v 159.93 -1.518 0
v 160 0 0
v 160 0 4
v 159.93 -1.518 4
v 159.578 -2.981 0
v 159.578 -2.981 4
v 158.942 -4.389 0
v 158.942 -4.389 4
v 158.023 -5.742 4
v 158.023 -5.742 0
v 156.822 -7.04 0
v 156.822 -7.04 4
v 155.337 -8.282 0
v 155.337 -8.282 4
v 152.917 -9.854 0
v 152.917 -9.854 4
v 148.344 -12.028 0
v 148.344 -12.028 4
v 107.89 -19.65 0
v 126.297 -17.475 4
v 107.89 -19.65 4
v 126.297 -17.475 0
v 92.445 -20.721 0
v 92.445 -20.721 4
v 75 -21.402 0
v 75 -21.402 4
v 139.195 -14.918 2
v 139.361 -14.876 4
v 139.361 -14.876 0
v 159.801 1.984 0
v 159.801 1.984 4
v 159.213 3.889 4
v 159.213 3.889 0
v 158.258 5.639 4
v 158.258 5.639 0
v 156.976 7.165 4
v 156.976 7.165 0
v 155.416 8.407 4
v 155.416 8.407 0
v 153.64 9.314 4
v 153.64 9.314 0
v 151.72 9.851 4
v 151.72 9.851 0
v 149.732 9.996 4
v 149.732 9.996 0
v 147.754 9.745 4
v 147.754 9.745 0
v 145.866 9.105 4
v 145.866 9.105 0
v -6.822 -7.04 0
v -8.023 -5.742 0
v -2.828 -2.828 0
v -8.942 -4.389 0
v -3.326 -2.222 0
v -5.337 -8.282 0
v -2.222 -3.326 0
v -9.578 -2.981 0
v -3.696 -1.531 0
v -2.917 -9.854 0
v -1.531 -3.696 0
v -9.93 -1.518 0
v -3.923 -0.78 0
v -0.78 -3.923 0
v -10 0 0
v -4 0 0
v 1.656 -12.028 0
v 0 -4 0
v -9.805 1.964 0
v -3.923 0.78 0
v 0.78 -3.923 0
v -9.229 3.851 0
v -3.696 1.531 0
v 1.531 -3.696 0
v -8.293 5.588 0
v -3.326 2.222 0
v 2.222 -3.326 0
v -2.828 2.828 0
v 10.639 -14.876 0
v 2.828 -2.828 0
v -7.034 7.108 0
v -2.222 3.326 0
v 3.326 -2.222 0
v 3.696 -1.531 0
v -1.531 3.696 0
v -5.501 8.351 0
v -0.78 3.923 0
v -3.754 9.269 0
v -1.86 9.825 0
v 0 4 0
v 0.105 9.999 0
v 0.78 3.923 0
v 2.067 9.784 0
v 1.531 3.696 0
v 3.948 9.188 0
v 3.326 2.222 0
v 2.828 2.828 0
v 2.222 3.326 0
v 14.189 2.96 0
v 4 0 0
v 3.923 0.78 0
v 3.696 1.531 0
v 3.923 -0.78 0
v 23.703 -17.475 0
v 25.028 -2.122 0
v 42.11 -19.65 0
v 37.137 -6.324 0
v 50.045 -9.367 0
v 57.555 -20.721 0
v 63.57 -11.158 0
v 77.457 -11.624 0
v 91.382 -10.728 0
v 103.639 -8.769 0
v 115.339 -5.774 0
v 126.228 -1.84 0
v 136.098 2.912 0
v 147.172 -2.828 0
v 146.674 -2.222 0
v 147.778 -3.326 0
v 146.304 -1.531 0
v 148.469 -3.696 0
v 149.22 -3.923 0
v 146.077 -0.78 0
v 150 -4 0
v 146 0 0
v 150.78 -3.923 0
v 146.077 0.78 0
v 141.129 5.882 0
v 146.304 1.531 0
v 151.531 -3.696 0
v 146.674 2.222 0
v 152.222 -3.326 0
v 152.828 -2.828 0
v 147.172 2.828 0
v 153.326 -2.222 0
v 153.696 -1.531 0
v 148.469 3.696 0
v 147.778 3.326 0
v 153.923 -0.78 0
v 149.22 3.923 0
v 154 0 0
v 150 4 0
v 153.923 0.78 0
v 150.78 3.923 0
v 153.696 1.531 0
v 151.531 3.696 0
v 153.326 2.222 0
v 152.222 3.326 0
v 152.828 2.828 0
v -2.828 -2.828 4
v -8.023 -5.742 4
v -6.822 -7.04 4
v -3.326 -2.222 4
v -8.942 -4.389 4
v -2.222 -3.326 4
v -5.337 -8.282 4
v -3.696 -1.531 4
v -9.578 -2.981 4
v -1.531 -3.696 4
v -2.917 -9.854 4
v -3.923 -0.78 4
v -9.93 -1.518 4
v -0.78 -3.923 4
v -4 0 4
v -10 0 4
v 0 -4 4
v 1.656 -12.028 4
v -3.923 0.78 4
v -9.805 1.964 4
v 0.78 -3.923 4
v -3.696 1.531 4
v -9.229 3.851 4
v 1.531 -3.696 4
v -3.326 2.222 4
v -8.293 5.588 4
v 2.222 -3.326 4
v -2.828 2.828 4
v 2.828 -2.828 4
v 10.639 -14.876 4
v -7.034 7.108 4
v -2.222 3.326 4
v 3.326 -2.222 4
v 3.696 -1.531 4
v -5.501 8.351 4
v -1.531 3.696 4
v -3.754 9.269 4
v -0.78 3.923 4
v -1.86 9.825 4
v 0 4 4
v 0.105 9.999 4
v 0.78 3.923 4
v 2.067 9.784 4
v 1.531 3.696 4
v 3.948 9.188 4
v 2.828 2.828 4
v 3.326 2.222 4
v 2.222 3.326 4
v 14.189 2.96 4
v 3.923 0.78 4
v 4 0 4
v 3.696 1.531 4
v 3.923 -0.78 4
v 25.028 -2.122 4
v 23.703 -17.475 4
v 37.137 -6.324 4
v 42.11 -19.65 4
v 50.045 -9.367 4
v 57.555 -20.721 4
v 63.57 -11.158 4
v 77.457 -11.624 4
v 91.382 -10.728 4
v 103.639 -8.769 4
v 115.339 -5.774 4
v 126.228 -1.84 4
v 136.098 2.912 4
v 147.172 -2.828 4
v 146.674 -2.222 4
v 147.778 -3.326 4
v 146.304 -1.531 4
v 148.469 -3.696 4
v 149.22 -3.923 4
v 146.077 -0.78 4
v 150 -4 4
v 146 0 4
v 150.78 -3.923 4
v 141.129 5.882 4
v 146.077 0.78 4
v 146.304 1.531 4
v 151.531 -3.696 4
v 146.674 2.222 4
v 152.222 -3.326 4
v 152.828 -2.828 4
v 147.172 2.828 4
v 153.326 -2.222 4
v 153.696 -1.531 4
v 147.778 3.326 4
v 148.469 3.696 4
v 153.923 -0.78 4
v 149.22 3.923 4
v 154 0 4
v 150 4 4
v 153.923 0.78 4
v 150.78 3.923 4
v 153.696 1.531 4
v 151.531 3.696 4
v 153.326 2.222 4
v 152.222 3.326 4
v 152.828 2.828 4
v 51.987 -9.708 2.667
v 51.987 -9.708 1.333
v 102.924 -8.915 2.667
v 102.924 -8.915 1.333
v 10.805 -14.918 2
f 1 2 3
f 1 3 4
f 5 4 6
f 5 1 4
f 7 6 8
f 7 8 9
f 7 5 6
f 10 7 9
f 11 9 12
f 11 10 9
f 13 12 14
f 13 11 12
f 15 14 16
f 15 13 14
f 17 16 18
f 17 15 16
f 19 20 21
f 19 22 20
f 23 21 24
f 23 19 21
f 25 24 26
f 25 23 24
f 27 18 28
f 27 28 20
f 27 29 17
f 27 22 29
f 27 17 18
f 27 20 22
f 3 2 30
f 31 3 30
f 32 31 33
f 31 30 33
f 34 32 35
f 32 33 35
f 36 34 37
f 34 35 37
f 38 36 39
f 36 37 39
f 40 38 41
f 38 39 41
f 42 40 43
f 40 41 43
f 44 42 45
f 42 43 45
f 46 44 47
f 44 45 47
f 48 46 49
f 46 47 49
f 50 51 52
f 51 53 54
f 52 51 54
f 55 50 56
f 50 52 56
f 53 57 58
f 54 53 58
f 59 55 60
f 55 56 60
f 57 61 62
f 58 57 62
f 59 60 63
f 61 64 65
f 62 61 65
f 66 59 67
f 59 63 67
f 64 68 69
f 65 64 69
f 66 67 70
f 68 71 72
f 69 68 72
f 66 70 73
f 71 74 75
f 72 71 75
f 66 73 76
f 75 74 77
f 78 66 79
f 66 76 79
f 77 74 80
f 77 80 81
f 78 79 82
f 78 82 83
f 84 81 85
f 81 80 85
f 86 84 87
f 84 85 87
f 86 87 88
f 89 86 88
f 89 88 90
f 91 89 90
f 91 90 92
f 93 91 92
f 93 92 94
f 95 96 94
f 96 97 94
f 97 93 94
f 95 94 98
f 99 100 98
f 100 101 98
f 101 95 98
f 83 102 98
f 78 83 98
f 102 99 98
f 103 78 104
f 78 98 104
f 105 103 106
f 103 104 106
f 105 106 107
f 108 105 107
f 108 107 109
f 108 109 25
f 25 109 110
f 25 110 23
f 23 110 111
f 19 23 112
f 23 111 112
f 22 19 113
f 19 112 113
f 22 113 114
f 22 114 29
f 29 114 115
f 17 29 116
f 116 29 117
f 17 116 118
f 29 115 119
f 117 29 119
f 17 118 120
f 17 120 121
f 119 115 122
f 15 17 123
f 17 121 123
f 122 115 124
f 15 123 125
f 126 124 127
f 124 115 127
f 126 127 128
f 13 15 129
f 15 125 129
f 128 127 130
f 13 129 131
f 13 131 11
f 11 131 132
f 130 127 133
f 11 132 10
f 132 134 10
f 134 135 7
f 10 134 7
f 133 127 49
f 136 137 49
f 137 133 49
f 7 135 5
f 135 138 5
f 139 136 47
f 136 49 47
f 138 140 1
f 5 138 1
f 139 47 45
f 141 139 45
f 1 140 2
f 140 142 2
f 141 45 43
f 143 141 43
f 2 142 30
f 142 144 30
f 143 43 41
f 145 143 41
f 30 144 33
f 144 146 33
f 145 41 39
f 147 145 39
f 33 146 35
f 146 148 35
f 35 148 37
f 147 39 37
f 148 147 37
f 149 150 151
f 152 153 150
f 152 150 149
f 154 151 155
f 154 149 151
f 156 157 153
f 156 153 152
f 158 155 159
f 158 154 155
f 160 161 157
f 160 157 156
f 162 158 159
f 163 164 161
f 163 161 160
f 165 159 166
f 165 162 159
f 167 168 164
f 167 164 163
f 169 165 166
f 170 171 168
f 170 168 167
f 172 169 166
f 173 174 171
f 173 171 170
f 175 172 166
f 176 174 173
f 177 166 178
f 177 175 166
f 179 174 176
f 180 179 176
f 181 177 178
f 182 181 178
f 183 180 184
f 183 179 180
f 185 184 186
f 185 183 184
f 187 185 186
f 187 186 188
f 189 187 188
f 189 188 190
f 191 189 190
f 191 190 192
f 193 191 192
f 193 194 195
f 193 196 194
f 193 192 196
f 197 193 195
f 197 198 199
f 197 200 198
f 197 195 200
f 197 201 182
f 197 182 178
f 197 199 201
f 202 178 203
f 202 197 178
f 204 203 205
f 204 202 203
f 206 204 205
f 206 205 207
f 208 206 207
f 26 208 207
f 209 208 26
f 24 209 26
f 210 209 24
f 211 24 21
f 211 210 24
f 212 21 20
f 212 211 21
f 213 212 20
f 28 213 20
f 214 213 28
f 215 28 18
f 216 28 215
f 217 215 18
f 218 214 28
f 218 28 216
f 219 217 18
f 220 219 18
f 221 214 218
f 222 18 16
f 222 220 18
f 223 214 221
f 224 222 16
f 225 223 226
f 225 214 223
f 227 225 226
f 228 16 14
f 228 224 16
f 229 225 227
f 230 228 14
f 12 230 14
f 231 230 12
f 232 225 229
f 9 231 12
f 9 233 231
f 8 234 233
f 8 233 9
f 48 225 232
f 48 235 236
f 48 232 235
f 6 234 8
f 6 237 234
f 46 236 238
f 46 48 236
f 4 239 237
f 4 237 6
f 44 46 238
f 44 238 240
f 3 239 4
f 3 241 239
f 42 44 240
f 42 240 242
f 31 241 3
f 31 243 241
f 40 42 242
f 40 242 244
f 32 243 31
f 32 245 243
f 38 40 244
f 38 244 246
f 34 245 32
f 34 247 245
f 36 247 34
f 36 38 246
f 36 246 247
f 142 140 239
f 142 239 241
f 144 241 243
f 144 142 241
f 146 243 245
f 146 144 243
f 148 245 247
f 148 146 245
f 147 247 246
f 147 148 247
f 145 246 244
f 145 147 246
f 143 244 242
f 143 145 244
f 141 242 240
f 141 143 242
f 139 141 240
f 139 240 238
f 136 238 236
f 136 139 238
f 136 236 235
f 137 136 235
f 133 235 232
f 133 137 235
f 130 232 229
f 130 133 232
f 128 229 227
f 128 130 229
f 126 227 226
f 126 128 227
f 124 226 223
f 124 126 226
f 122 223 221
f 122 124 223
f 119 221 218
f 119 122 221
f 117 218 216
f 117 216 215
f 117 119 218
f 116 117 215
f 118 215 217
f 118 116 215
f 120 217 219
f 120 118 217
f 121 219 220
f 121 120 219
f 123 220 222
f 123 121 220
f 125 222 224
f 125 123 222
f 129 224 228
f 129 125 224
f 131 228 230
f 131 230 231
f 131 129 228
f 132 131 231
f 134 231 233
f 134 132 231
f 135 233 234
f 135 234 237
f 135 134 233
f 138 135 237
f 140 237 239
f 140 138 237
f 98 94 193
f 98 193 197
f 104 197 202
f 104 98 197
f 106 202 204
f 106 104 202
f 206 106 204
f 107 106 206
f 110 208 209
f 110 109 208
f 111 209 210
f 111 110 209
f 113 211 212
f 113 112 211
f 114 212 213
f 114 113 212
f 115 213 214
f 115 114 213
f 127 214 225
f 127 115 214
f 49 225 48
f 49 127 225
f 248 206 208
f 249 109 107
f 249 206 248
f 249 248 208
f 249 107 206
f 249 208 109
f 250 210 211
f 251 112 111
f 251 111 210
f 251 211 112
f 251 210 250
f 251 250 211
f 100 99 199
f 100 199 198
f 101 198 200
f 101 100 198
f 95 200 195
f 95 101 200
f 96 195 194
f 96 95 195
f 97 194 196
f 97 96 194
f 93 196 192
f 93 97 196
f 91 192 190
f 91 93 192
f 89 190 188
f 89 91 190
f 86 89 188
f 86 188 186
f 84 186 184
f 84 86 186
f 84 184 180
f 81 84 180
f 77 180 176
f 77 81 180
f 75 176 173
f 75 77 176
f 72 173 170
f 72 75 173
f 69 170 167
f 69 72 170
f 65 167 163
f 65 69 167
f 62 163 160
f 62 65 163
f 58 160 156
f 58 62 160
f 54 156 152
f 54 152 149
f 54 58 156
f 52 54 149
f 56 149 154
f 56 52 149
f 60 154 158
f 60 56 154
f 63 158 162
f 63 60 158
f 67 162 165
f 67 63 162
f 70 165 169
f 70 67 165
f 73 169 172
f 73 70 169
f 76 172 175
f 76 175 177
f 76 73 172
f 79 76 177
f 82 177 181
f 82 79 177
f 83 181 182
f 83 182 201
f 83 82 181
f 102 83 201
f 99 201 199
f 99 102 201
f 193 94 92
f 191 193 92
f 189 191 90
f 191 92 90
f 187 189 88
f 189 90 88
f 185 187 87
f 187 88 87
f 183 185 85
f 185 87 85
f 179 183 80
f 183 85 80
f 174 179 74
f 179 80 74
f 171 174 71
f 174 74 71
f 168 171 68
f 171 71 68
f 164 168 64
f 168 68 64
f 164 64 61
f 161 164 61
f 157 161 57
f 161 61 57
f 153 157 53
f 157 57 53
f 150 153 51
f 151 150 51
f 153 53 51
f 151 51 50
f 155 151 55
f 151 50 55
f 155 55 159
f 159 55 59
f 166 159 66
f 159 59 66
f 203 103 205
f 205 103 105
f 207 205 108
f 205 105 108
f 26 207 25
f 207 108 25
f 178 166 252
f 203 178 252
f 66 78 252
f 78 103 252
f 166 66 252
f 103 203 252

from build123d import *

# Parameters (mm, degrees)
SKETCH_1_R      = 4
EXTRUDE_1_DEPTH = 4


with BuildPart() as part:
    # 草图1 → 凸台-拉伸1 (new body)
    with BuildSketch(Plane.XY):
        with BuildLine():
            ThreePointArc((3.948047826, 9.187650318), (-5.50088728, 8.351062156), (-10, 0))
            add(Edge.make_bspline(
                [(-10, 0), (-10.890214237, -19.135341361), (75, -21.401956932)],
                knots=[0, 0, 0, 1, 1, 1], degree=2))
            add(Edge.make_bspline(
                [(160, 0), (160.890214237, -19.135341361), (75, -21.401956932)],
                knots=[0, 0, 0, 1, 1, 1], degree=2))
            ThreePointArc((160, 0), (155.415713455, 8.40654791), (145.865990446, 9.105490926))
            add(Edge.make_bspline(
                [(3.948047826, 9.187650318), (46.906488456, -20.373746255), (110.551742639, -16.70704022), (145.865990446, 9.105490926)],
                knots=[0.022448948, 0.022448948, 0.022448948, 0.022448948, 0.850781246, 0.850781246, 0.850781246, 0.850781246], degree=3))
        make_face()
        Circle(SKETCH_1_R, mode=Mode.SUBTRACT)
        with Locations((150, 0)):
            Circle(SKETCH_1_R, mode=Mode.SUBTRACT)
    extrude(amount=EXTRUDE_1_DEPTH)


solid = part.part
